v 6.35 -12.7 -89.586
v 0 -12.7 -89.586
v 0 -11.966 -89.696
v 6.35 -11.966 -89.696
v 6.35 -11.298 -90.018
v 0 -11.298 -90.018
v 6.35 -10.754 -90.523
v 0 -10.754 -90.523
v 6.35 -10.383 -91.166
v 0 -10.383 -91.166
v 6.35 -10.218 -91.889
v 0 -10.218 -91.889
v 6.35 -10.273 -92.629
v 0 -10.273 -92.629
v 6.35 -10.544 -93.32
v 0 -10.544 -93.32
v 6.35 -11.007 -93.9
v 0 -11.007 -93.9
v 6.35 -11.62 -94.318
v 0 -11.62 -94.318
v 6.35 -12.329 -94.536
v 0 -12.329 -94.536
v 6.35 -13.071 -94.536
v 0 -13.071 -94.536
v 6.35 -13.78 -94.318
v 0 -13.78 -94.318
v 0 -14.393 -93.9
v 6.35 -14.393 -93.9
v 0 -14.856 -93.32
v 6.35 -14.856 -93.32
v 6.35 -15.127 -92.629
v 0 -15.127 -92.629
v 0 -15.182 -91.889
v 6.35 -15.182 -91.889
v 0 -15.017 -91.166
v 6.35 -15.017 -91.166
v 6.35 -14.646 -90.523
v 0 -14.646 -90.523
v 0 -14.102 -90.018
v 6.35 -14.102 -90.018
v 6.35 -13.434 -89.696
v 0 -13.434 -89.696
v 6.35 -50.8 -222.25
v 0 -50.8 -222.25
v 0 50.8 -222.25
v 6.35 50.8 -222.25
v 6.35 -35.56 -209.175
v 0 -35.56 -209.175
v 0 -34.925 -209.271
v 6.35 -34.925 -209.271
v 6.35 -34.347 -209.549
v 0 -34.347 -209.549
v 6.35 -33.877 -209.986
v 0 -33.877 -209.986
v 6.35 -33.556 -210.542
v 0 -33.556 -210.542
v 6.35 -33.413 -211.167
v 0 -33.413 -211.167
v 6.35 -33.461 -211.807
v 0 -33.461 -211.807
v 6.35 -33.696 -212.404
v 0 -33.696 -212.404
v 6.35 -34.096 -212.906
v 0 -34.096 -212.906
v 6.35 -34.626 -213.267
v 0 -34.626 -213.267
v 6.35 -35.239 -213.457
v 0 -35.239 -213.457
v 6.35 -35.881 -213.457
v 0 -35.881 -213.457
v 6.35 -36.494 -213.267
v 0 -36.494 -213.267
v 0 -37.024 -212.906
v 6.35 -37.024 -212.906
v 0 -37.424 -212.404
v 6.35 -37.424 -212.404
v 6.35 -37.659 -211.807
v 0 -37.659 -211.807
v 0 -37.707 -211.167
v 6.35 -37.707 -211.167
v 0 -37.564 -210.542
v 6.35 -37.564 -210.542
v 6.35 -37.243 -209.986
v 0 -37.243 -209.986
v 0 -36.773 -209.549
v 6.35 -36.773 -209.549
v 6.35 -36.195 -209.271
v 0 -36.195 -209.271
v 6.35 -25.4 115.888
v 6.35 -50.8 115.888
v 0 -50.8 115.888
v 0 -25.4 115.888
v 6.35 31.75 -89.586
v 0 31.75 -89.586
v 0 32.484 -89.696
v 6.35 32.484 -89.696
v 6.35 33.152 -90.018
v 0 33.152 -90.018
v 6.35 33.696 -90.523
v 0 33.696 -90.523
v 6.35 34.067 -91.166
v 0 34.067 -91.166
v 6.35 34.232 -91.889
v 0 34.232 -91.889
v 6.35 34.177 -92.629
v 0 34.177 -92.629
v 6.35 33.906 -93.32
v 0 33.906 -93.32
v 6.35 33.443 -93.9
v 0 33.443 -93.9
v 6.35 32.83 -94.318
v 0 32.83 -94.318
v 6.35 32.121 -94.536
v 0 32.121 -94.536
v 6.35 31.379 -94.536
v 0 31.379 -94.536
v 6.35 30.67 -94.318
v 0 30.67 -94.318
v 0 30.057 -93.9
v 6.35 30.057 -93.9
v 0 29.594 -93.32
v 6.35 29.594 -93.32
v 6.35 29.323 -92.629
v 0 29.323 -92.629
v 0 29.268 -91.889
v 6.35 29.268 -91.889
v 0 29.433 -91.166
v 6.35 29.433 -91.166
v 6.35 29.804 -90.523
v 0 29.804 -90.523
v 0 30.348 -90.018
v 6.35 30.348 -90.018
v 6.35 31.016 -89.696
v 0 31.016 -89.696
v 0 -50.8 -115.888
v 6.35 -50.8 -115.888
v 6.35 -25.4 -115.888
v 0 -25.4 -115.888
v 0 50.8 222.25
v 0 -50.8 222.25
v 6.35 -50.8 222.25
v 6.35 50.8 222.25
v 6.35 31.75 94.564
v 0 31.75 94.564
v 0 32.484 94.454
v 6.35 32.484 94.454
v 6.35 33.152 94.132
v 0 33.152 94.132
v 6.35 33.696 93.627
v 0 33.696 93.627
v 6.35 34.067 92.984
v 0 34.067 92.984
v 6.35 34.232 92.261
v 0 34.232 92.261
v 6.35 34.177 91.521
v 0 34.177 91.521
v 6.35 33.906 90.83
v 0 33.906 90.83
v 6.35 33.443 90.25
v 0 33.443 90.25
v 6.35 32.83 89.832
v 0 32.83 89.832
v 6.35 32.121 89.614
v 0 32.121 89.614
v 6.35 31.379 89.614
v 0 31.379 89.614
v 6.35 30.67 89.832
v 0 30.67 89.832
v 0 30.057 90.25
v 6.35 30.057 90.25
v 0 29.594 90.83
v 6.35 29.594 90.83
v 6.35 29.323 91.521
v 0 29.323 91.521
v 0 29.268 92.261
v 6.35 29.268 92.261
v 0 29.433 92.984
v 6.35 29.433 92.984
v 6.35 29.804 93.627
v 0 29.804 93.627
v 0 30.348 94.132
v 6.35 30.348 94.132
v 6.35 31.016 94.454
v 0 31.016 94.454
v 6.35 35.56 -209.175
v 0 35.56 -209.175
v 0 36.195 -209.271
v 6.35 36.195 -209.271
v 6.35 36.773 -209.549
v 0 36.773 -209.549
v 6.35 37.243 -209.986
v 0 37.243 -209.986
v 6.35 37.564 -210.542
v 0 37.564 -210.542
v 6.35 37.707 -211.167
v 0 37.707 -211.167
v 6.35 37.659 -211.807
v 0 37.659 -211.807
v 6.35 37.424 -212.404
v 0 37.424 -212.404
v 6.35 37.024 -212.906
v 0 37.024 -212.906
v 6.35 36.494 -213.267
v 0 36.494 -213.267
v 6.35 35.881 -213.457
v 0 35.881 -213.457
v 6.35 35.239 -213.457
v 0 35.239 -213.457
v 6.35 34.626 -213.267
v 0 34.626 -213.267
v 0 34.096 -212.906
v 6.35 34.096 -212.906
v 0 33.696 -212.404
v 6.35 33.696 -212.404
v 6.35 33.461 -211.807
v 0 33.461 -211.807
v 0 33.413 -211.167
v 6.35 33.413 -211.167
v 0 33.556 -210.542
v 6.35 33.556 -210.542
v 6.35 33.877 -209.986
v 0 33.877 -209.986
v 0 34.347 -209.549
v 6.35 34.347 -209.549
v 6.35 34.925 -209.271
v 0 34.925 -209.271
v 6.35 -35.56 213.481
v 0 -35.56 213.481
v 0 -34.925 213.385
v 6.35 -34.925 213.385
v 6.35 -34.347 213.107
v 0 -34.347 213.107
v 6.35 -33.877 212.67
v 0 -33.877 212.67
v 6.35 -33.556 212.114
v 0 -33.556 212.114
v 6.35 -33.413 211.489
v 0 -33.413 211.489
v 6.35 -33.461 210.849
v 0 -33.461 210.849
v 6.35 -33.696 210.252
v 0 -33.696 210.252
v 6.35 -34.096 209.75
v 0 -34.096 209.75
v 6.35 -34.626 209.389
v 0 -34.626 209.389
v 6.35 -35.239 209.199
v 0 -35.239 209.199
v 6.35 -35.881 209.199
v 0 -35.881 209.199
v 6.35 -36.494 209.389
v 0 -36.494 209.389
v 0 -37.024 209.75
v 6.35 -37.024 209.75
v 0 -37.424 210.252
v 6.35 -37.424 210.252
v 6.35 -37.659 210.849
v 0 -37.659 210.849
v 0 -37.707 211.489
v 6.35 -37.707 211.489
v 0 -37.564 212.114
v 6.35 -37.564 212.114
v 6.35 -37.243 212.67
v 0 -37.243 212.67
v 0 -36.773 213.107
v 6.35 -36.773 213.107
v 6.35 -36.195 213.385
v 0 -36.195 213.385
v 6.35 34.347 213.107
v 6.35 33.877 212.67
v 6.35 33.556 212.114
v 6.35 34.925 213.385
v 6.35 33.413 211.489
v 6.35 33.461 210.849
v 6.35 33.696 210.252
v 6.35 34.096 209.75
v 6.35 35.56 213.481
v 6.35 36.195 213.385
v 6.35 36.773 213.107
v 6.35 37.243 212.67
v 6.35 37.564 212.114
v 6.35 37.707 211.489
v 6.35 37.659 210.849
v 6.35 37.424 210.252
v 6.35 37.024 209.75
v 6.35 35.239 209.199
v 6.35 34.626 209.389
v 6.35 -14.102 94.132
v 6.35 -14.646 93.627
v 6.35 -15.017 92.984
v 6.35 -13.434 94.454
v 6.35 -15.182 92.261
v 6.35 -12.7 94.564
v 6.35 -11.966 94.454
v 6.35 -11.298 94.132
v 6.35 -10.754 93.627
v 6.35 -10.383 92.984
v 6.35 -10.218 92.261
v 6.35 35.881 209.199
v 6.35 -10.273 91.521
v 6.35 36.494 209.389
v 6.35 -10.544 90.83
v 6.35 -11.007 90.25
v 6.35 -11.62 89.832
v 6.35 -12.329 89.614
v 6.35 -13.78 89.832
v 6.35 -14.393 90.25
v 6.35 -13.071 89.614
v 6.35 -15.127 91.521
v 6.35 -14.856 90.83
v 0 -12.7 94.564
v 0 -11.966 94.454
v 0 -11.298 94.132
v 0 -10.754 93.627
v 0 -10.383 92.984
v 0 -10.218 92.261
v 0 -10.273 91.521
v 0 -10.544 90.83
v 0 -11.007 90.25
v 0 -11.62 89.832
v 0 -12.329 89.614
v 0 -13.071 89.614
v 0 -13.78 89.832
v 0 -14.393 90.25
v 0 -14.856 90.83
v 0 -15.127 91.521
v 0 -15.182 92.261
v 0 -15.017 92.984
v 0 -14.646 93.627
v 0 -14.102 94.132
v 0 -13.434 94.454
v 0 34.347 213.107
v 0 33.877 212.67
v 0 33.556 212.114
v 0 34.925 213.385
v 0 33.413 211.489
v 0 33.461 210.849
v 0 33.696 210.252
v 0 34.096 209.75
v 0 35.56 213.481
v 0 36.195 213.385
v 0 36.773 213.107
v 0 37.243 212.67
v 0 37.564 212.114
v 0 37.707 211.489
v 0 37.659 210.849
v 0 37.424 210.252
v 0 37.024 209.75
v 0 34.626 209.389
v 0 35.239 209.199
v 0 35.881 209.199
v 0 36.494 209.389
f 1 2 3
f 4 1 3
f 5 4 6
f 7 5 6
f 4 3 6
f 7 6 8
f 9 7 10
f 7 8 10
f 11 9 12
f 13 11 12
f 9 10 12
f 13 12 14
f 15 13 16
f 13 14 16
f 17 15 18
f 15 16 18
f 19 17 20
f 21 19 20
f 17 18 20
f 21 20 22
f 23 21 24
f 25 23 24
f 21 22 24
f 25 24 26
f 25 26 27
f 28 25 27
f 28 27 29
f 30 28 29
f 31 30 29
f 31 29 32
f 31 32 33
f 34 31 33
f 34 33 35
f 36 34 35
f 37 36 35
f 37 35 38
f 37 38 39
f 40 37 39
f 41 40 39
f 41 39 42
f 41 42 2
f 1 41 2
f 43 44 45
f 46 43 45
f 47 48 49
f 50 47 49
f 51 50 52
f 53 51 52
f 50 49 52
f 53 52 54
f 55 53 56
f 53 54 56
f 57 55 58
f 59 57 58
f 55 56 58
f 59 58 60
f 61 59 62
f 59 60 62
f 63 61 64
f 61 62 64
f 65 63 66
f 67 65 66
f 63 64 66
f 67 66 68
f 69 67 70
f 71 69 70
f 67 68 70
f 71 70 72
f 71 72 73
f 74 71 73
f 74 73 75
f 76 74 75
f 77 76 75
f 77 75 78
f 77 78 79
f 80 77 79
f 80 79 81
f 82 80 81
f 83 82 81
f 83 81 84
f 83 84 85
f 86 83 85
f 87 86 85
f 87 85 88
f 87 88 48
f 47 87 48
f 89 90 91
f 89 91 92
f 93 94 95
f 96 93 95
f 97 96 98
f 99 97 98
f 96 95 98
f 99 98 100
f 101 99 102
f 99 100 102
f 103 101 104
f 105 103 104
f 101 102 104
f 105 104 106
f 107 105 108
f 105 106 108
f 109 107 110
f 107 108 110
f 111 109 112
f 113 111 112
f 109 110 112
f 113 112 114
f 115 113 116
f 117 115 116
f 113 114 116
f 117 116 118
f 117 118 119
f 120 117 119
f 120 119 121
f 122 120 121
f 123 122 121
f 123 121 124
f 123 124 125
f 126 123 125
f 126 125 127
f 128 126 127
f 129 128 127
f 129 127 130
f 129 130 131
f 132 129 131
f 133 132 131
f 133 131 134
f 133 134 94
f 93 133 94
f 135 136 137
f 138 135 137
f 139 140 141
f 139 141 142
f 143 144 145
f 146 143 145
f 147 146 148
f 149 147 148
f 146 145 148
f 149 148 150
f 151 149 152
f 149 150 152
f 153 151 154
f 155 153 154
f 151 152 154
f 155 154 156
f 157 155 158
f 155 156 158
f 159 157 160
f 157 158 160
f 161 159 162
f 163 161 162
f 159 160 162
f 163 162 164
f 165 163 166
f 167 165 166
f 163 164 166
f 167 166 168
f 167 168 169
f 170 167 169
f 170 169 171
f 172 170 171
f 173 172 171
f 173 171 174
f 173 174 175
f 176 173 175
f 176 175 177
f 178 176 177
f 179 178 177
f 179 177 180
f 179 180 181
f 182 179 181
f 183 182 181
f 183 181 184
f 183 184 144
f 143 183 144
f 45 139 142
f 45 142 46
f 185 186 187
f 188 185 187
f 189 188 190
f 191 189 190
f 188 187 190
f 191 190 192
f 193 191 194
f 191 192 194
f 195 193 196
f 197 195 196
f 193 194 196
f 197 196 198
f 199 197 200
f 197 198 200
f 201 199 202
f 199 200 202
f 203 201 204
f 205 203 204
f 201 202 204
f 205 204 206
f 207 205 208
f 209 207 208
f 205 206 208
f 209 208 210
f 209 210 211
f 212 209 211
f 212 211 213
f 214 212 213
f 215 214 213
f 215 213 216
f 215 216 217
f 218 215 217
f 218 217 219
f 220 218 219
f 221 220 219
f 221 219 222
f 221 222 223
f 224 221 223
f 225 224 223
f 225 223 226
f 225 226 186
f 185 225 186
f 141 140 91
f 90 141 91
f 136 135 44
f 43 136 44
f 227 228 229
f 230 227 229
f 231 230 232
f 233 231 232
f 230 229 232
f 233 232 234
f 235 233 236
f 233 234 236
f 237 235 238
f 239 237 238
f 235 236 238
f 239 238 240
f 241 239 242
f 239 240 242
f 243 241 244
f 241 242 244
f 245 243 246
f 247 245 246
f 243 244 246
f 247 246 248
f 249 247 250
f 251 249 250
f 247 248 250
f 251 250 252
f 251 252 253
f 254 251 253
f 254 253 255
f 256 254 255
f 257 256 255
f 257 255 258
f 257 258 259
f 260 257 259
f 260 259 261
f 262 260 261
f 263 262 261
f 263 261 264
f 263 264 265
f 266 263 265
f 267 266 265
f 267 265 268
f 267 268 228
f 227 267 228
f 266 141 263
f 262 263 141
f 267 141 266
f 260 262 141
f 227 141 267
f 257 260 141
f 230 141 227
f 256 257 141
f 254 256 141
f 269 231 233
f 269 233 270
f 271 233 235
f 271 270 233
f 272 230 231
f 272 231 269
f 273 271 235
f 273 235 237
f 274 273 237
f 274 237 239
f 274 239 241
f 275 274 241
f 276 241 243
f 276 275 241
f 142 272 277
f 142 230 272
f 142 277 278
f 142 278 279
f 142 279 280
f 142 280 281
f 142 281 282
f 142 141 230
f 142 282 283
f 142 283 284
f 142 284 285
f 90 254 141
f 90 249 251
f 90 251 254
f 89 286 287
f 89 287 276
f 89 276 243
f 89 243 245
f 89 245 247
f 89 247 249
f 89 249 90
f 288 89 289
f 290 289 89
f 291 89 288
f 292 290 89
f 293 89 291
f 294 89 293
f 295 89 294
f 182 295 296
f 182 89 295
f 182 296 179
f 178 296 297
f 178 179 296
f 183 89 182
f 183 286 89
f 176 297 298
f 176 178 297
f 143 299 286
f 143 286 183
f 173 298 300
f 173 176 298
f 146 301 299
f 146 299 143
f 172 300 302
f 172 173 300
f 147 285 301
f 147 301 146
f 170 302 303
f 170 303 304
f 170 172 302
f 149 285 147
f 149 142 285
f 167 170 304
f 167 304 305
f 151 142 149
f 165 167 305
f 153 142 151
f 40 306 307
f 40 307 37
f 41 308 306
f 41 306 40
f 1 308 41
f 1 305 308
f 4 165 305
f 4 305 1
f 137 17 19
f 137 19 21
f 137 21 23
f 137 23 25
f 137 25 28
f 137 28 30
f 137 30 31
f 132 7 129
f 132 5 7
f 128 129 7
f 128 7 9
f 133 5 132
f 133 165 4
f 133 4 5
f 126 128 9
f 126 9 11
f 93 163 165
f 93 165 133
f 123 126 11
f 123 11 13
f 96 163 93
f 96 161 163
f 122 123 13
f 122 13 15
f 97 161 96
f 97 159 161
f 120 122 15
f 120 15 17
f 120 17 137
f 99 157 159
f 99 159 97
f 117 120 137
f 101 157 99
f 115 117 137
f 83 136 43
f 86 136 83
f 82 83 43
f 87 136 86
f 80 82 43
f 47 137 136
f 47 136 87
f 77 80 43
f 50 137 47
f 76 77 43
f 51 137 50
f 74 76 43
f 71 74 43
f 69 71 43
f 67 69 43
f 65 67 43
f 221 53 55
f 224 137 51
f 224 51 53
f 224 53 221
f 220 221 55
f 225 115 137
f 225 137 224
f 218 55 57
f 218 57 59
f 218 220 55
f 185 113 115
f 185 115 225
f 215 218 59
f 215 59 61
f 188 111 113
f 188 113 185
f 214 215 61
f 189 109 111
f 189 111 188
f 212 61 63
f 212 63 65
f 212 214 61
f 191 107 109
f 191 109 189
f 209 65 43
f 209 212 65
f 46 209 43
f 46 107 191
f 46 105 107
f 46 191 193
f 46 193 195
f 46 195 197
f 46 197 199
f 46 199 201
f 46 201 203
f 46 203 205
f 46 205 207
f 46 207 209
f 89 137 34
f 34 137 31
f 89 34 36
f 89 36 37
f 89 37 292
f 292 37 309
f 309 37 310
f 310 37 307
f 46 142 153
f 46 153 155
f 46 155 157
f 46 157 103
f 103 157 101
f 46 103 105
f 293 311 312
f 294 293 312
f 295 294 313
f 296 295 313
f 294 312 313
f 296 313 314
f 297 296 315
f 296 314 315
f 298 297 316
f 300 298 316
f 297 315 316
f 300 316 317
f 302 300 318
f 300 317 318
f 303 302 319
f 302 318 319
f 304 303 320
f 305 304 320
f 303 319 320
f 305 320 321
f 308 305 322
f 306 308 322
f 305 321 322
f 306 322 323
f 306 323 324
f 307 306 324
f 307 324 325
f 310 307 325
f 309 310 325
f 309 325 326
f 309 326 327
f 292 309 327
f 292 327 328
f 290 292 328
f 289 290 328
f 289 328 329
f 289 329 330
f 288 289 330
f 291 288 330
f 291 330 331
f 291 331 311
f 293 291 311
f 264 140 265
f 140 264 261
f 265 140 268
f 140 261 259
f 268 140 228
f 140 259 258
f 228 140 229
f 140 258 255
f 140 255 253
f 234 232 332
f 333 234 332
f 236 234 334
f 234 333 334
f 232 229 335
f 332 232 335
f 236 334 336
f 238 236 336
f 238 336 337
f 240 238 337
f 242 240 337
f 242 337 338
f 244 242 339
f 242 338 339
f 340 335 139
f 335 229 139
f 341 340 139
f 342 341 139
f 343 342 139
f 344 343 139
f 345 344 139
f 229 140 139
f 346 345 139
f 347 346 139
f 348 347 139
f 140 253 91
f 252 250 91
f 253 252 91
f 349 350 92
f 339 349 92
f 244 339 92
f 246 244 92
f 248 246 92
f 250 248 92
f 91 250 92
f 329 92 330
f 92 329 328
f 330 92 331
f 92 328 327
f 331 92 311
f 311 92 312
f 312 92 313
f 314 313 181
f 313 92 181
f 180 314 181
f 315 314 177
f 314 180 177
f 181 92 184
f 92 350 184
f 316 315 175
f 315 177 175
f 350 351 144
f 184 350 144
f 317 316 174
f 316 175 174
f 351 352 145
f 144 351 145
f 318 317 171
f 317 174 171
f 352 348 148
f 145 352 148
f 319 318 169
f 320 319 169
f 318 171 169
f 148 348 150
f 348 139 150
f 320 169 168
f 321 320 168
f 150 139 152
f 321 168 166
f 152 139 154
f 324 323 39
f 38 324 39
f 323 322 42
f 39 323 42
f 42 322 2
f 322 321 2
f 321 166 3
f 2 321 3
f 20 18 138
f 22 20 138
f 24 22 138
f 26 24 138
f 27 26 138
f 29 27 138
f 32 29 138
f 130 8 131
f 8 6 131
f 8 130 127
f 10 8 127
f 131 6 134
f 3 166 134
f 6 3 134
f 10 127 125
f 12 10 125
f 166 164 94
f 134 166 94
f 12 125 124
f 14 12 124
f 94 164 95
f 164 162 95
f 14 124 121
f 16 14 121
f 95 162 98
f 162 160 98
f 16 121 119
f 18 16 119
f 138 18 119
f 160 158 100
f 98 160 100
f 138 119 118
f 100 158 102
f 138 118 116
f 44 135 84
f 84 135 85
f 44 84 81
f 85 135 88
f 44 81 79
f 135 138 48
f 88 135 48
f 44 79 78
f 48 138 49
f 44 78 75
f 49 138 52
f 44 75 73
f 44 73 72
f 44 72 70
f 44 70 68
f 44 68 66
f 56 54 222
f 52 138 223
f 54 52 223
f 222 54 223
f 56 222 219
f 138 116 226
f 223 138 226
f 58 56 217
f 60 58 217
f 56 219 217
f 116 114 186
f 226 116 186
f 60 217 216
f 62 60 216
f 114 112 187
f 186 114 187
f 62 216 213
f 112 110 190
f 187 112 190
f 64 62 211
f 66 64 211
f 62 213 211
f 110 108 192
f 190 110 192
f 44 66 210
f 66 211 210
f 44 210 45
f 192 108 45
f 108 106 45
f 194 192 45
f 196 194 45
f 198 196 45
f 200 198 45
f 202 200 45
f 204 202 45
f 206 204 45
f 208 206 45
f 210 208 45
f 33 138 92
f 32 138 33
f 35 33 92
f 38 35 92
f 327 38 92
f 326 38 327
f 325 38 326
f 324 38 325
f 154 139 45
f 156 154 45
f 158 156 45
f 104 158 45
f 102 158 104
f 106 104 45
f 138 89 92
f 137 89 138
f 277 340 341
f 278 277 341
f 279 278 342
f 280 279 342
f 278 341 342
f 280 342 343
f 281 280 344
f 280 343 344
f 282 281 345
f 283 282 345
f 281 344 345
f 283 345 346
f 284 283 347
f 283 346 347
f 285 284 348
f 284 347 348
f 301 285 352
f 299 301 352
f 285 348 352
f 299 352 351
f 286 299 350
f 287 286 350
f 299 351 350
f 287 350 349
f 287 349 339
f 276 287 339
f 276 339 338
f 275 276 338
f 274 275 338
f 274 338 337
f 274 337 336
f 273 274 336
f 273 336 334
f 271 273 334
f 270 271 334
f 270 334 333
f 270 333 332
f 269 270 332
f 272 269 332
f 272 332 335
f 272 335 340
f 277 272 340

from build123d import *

# Parameters (mm, degrees)
SKETCH1_W              = 444.5
SKETCH1_H              = 101.6
BOSS_EXTRUDE1_DEPTH    = 6.35
F_10_CLEARANCE_HOLE1_D = 4.9784
F_8_CLEARANCE_HOLE1_D  = 4.3053
SKETCH12_W             = 231.775
SKETCH12_H             = 25.4
CUT_EXTRUDE2_DEPTH     = 229.07021945


with BuildPart() as part:
    # Sketch1 → Boss-Extrude1 (new body)
    with BuildSketch(Plane(origin=(0, 0, 0), x_dir=(0, 0, -1), z_dir=(1, 0, 0))):
        Rectangle(SKETCH1_W, SKETCH1_H)
    extrude(amount=BOSS_EXTRUDE1_DEPTH)

    # #10 Clearance Hole1 (through all)
    with Locations(Plane(origin=(6.35, 0, 0), x_dir=(0, 0, -1), z_dir=(1, 0, 0))):
        with Locations((92.075, 31.75), (92.075, -12.7), (-92.075, 31.75), (-92.075, -12.7)):
            Hole(F_10_CLEARANCE_HOLE1_D / 2)

    # #8 Clearance Hole1 (through all)
    with Locations(Plane(origin=(6.35, 0, 0), x_dir=(0, 0, -1), z_dir=(1, 0, 0))):
        with Locations((-211.328, 35.56), (-211.328, -35.56), (211.328, -35.56), (211.328, 35.56)):
            Hole(F_8_CLEARANCE_HOLE1_D / 2)

    # Sketch12 → Cut-Extrude2 (cut, through all)
    with BuildSketch(Plane(origin=(6.35, 0, 0), x_dir=(0, 0, -1), z_dir=(1, 0, 0))):
        with Locations((0, -38.1)):
            Rectangle(SKETCH12_W, SKETCH12_H)
    extrude(amount=-CUT_EXTRUDE2_DEPTH, mode=Mode.SUBTRACT)


solid = part.part
